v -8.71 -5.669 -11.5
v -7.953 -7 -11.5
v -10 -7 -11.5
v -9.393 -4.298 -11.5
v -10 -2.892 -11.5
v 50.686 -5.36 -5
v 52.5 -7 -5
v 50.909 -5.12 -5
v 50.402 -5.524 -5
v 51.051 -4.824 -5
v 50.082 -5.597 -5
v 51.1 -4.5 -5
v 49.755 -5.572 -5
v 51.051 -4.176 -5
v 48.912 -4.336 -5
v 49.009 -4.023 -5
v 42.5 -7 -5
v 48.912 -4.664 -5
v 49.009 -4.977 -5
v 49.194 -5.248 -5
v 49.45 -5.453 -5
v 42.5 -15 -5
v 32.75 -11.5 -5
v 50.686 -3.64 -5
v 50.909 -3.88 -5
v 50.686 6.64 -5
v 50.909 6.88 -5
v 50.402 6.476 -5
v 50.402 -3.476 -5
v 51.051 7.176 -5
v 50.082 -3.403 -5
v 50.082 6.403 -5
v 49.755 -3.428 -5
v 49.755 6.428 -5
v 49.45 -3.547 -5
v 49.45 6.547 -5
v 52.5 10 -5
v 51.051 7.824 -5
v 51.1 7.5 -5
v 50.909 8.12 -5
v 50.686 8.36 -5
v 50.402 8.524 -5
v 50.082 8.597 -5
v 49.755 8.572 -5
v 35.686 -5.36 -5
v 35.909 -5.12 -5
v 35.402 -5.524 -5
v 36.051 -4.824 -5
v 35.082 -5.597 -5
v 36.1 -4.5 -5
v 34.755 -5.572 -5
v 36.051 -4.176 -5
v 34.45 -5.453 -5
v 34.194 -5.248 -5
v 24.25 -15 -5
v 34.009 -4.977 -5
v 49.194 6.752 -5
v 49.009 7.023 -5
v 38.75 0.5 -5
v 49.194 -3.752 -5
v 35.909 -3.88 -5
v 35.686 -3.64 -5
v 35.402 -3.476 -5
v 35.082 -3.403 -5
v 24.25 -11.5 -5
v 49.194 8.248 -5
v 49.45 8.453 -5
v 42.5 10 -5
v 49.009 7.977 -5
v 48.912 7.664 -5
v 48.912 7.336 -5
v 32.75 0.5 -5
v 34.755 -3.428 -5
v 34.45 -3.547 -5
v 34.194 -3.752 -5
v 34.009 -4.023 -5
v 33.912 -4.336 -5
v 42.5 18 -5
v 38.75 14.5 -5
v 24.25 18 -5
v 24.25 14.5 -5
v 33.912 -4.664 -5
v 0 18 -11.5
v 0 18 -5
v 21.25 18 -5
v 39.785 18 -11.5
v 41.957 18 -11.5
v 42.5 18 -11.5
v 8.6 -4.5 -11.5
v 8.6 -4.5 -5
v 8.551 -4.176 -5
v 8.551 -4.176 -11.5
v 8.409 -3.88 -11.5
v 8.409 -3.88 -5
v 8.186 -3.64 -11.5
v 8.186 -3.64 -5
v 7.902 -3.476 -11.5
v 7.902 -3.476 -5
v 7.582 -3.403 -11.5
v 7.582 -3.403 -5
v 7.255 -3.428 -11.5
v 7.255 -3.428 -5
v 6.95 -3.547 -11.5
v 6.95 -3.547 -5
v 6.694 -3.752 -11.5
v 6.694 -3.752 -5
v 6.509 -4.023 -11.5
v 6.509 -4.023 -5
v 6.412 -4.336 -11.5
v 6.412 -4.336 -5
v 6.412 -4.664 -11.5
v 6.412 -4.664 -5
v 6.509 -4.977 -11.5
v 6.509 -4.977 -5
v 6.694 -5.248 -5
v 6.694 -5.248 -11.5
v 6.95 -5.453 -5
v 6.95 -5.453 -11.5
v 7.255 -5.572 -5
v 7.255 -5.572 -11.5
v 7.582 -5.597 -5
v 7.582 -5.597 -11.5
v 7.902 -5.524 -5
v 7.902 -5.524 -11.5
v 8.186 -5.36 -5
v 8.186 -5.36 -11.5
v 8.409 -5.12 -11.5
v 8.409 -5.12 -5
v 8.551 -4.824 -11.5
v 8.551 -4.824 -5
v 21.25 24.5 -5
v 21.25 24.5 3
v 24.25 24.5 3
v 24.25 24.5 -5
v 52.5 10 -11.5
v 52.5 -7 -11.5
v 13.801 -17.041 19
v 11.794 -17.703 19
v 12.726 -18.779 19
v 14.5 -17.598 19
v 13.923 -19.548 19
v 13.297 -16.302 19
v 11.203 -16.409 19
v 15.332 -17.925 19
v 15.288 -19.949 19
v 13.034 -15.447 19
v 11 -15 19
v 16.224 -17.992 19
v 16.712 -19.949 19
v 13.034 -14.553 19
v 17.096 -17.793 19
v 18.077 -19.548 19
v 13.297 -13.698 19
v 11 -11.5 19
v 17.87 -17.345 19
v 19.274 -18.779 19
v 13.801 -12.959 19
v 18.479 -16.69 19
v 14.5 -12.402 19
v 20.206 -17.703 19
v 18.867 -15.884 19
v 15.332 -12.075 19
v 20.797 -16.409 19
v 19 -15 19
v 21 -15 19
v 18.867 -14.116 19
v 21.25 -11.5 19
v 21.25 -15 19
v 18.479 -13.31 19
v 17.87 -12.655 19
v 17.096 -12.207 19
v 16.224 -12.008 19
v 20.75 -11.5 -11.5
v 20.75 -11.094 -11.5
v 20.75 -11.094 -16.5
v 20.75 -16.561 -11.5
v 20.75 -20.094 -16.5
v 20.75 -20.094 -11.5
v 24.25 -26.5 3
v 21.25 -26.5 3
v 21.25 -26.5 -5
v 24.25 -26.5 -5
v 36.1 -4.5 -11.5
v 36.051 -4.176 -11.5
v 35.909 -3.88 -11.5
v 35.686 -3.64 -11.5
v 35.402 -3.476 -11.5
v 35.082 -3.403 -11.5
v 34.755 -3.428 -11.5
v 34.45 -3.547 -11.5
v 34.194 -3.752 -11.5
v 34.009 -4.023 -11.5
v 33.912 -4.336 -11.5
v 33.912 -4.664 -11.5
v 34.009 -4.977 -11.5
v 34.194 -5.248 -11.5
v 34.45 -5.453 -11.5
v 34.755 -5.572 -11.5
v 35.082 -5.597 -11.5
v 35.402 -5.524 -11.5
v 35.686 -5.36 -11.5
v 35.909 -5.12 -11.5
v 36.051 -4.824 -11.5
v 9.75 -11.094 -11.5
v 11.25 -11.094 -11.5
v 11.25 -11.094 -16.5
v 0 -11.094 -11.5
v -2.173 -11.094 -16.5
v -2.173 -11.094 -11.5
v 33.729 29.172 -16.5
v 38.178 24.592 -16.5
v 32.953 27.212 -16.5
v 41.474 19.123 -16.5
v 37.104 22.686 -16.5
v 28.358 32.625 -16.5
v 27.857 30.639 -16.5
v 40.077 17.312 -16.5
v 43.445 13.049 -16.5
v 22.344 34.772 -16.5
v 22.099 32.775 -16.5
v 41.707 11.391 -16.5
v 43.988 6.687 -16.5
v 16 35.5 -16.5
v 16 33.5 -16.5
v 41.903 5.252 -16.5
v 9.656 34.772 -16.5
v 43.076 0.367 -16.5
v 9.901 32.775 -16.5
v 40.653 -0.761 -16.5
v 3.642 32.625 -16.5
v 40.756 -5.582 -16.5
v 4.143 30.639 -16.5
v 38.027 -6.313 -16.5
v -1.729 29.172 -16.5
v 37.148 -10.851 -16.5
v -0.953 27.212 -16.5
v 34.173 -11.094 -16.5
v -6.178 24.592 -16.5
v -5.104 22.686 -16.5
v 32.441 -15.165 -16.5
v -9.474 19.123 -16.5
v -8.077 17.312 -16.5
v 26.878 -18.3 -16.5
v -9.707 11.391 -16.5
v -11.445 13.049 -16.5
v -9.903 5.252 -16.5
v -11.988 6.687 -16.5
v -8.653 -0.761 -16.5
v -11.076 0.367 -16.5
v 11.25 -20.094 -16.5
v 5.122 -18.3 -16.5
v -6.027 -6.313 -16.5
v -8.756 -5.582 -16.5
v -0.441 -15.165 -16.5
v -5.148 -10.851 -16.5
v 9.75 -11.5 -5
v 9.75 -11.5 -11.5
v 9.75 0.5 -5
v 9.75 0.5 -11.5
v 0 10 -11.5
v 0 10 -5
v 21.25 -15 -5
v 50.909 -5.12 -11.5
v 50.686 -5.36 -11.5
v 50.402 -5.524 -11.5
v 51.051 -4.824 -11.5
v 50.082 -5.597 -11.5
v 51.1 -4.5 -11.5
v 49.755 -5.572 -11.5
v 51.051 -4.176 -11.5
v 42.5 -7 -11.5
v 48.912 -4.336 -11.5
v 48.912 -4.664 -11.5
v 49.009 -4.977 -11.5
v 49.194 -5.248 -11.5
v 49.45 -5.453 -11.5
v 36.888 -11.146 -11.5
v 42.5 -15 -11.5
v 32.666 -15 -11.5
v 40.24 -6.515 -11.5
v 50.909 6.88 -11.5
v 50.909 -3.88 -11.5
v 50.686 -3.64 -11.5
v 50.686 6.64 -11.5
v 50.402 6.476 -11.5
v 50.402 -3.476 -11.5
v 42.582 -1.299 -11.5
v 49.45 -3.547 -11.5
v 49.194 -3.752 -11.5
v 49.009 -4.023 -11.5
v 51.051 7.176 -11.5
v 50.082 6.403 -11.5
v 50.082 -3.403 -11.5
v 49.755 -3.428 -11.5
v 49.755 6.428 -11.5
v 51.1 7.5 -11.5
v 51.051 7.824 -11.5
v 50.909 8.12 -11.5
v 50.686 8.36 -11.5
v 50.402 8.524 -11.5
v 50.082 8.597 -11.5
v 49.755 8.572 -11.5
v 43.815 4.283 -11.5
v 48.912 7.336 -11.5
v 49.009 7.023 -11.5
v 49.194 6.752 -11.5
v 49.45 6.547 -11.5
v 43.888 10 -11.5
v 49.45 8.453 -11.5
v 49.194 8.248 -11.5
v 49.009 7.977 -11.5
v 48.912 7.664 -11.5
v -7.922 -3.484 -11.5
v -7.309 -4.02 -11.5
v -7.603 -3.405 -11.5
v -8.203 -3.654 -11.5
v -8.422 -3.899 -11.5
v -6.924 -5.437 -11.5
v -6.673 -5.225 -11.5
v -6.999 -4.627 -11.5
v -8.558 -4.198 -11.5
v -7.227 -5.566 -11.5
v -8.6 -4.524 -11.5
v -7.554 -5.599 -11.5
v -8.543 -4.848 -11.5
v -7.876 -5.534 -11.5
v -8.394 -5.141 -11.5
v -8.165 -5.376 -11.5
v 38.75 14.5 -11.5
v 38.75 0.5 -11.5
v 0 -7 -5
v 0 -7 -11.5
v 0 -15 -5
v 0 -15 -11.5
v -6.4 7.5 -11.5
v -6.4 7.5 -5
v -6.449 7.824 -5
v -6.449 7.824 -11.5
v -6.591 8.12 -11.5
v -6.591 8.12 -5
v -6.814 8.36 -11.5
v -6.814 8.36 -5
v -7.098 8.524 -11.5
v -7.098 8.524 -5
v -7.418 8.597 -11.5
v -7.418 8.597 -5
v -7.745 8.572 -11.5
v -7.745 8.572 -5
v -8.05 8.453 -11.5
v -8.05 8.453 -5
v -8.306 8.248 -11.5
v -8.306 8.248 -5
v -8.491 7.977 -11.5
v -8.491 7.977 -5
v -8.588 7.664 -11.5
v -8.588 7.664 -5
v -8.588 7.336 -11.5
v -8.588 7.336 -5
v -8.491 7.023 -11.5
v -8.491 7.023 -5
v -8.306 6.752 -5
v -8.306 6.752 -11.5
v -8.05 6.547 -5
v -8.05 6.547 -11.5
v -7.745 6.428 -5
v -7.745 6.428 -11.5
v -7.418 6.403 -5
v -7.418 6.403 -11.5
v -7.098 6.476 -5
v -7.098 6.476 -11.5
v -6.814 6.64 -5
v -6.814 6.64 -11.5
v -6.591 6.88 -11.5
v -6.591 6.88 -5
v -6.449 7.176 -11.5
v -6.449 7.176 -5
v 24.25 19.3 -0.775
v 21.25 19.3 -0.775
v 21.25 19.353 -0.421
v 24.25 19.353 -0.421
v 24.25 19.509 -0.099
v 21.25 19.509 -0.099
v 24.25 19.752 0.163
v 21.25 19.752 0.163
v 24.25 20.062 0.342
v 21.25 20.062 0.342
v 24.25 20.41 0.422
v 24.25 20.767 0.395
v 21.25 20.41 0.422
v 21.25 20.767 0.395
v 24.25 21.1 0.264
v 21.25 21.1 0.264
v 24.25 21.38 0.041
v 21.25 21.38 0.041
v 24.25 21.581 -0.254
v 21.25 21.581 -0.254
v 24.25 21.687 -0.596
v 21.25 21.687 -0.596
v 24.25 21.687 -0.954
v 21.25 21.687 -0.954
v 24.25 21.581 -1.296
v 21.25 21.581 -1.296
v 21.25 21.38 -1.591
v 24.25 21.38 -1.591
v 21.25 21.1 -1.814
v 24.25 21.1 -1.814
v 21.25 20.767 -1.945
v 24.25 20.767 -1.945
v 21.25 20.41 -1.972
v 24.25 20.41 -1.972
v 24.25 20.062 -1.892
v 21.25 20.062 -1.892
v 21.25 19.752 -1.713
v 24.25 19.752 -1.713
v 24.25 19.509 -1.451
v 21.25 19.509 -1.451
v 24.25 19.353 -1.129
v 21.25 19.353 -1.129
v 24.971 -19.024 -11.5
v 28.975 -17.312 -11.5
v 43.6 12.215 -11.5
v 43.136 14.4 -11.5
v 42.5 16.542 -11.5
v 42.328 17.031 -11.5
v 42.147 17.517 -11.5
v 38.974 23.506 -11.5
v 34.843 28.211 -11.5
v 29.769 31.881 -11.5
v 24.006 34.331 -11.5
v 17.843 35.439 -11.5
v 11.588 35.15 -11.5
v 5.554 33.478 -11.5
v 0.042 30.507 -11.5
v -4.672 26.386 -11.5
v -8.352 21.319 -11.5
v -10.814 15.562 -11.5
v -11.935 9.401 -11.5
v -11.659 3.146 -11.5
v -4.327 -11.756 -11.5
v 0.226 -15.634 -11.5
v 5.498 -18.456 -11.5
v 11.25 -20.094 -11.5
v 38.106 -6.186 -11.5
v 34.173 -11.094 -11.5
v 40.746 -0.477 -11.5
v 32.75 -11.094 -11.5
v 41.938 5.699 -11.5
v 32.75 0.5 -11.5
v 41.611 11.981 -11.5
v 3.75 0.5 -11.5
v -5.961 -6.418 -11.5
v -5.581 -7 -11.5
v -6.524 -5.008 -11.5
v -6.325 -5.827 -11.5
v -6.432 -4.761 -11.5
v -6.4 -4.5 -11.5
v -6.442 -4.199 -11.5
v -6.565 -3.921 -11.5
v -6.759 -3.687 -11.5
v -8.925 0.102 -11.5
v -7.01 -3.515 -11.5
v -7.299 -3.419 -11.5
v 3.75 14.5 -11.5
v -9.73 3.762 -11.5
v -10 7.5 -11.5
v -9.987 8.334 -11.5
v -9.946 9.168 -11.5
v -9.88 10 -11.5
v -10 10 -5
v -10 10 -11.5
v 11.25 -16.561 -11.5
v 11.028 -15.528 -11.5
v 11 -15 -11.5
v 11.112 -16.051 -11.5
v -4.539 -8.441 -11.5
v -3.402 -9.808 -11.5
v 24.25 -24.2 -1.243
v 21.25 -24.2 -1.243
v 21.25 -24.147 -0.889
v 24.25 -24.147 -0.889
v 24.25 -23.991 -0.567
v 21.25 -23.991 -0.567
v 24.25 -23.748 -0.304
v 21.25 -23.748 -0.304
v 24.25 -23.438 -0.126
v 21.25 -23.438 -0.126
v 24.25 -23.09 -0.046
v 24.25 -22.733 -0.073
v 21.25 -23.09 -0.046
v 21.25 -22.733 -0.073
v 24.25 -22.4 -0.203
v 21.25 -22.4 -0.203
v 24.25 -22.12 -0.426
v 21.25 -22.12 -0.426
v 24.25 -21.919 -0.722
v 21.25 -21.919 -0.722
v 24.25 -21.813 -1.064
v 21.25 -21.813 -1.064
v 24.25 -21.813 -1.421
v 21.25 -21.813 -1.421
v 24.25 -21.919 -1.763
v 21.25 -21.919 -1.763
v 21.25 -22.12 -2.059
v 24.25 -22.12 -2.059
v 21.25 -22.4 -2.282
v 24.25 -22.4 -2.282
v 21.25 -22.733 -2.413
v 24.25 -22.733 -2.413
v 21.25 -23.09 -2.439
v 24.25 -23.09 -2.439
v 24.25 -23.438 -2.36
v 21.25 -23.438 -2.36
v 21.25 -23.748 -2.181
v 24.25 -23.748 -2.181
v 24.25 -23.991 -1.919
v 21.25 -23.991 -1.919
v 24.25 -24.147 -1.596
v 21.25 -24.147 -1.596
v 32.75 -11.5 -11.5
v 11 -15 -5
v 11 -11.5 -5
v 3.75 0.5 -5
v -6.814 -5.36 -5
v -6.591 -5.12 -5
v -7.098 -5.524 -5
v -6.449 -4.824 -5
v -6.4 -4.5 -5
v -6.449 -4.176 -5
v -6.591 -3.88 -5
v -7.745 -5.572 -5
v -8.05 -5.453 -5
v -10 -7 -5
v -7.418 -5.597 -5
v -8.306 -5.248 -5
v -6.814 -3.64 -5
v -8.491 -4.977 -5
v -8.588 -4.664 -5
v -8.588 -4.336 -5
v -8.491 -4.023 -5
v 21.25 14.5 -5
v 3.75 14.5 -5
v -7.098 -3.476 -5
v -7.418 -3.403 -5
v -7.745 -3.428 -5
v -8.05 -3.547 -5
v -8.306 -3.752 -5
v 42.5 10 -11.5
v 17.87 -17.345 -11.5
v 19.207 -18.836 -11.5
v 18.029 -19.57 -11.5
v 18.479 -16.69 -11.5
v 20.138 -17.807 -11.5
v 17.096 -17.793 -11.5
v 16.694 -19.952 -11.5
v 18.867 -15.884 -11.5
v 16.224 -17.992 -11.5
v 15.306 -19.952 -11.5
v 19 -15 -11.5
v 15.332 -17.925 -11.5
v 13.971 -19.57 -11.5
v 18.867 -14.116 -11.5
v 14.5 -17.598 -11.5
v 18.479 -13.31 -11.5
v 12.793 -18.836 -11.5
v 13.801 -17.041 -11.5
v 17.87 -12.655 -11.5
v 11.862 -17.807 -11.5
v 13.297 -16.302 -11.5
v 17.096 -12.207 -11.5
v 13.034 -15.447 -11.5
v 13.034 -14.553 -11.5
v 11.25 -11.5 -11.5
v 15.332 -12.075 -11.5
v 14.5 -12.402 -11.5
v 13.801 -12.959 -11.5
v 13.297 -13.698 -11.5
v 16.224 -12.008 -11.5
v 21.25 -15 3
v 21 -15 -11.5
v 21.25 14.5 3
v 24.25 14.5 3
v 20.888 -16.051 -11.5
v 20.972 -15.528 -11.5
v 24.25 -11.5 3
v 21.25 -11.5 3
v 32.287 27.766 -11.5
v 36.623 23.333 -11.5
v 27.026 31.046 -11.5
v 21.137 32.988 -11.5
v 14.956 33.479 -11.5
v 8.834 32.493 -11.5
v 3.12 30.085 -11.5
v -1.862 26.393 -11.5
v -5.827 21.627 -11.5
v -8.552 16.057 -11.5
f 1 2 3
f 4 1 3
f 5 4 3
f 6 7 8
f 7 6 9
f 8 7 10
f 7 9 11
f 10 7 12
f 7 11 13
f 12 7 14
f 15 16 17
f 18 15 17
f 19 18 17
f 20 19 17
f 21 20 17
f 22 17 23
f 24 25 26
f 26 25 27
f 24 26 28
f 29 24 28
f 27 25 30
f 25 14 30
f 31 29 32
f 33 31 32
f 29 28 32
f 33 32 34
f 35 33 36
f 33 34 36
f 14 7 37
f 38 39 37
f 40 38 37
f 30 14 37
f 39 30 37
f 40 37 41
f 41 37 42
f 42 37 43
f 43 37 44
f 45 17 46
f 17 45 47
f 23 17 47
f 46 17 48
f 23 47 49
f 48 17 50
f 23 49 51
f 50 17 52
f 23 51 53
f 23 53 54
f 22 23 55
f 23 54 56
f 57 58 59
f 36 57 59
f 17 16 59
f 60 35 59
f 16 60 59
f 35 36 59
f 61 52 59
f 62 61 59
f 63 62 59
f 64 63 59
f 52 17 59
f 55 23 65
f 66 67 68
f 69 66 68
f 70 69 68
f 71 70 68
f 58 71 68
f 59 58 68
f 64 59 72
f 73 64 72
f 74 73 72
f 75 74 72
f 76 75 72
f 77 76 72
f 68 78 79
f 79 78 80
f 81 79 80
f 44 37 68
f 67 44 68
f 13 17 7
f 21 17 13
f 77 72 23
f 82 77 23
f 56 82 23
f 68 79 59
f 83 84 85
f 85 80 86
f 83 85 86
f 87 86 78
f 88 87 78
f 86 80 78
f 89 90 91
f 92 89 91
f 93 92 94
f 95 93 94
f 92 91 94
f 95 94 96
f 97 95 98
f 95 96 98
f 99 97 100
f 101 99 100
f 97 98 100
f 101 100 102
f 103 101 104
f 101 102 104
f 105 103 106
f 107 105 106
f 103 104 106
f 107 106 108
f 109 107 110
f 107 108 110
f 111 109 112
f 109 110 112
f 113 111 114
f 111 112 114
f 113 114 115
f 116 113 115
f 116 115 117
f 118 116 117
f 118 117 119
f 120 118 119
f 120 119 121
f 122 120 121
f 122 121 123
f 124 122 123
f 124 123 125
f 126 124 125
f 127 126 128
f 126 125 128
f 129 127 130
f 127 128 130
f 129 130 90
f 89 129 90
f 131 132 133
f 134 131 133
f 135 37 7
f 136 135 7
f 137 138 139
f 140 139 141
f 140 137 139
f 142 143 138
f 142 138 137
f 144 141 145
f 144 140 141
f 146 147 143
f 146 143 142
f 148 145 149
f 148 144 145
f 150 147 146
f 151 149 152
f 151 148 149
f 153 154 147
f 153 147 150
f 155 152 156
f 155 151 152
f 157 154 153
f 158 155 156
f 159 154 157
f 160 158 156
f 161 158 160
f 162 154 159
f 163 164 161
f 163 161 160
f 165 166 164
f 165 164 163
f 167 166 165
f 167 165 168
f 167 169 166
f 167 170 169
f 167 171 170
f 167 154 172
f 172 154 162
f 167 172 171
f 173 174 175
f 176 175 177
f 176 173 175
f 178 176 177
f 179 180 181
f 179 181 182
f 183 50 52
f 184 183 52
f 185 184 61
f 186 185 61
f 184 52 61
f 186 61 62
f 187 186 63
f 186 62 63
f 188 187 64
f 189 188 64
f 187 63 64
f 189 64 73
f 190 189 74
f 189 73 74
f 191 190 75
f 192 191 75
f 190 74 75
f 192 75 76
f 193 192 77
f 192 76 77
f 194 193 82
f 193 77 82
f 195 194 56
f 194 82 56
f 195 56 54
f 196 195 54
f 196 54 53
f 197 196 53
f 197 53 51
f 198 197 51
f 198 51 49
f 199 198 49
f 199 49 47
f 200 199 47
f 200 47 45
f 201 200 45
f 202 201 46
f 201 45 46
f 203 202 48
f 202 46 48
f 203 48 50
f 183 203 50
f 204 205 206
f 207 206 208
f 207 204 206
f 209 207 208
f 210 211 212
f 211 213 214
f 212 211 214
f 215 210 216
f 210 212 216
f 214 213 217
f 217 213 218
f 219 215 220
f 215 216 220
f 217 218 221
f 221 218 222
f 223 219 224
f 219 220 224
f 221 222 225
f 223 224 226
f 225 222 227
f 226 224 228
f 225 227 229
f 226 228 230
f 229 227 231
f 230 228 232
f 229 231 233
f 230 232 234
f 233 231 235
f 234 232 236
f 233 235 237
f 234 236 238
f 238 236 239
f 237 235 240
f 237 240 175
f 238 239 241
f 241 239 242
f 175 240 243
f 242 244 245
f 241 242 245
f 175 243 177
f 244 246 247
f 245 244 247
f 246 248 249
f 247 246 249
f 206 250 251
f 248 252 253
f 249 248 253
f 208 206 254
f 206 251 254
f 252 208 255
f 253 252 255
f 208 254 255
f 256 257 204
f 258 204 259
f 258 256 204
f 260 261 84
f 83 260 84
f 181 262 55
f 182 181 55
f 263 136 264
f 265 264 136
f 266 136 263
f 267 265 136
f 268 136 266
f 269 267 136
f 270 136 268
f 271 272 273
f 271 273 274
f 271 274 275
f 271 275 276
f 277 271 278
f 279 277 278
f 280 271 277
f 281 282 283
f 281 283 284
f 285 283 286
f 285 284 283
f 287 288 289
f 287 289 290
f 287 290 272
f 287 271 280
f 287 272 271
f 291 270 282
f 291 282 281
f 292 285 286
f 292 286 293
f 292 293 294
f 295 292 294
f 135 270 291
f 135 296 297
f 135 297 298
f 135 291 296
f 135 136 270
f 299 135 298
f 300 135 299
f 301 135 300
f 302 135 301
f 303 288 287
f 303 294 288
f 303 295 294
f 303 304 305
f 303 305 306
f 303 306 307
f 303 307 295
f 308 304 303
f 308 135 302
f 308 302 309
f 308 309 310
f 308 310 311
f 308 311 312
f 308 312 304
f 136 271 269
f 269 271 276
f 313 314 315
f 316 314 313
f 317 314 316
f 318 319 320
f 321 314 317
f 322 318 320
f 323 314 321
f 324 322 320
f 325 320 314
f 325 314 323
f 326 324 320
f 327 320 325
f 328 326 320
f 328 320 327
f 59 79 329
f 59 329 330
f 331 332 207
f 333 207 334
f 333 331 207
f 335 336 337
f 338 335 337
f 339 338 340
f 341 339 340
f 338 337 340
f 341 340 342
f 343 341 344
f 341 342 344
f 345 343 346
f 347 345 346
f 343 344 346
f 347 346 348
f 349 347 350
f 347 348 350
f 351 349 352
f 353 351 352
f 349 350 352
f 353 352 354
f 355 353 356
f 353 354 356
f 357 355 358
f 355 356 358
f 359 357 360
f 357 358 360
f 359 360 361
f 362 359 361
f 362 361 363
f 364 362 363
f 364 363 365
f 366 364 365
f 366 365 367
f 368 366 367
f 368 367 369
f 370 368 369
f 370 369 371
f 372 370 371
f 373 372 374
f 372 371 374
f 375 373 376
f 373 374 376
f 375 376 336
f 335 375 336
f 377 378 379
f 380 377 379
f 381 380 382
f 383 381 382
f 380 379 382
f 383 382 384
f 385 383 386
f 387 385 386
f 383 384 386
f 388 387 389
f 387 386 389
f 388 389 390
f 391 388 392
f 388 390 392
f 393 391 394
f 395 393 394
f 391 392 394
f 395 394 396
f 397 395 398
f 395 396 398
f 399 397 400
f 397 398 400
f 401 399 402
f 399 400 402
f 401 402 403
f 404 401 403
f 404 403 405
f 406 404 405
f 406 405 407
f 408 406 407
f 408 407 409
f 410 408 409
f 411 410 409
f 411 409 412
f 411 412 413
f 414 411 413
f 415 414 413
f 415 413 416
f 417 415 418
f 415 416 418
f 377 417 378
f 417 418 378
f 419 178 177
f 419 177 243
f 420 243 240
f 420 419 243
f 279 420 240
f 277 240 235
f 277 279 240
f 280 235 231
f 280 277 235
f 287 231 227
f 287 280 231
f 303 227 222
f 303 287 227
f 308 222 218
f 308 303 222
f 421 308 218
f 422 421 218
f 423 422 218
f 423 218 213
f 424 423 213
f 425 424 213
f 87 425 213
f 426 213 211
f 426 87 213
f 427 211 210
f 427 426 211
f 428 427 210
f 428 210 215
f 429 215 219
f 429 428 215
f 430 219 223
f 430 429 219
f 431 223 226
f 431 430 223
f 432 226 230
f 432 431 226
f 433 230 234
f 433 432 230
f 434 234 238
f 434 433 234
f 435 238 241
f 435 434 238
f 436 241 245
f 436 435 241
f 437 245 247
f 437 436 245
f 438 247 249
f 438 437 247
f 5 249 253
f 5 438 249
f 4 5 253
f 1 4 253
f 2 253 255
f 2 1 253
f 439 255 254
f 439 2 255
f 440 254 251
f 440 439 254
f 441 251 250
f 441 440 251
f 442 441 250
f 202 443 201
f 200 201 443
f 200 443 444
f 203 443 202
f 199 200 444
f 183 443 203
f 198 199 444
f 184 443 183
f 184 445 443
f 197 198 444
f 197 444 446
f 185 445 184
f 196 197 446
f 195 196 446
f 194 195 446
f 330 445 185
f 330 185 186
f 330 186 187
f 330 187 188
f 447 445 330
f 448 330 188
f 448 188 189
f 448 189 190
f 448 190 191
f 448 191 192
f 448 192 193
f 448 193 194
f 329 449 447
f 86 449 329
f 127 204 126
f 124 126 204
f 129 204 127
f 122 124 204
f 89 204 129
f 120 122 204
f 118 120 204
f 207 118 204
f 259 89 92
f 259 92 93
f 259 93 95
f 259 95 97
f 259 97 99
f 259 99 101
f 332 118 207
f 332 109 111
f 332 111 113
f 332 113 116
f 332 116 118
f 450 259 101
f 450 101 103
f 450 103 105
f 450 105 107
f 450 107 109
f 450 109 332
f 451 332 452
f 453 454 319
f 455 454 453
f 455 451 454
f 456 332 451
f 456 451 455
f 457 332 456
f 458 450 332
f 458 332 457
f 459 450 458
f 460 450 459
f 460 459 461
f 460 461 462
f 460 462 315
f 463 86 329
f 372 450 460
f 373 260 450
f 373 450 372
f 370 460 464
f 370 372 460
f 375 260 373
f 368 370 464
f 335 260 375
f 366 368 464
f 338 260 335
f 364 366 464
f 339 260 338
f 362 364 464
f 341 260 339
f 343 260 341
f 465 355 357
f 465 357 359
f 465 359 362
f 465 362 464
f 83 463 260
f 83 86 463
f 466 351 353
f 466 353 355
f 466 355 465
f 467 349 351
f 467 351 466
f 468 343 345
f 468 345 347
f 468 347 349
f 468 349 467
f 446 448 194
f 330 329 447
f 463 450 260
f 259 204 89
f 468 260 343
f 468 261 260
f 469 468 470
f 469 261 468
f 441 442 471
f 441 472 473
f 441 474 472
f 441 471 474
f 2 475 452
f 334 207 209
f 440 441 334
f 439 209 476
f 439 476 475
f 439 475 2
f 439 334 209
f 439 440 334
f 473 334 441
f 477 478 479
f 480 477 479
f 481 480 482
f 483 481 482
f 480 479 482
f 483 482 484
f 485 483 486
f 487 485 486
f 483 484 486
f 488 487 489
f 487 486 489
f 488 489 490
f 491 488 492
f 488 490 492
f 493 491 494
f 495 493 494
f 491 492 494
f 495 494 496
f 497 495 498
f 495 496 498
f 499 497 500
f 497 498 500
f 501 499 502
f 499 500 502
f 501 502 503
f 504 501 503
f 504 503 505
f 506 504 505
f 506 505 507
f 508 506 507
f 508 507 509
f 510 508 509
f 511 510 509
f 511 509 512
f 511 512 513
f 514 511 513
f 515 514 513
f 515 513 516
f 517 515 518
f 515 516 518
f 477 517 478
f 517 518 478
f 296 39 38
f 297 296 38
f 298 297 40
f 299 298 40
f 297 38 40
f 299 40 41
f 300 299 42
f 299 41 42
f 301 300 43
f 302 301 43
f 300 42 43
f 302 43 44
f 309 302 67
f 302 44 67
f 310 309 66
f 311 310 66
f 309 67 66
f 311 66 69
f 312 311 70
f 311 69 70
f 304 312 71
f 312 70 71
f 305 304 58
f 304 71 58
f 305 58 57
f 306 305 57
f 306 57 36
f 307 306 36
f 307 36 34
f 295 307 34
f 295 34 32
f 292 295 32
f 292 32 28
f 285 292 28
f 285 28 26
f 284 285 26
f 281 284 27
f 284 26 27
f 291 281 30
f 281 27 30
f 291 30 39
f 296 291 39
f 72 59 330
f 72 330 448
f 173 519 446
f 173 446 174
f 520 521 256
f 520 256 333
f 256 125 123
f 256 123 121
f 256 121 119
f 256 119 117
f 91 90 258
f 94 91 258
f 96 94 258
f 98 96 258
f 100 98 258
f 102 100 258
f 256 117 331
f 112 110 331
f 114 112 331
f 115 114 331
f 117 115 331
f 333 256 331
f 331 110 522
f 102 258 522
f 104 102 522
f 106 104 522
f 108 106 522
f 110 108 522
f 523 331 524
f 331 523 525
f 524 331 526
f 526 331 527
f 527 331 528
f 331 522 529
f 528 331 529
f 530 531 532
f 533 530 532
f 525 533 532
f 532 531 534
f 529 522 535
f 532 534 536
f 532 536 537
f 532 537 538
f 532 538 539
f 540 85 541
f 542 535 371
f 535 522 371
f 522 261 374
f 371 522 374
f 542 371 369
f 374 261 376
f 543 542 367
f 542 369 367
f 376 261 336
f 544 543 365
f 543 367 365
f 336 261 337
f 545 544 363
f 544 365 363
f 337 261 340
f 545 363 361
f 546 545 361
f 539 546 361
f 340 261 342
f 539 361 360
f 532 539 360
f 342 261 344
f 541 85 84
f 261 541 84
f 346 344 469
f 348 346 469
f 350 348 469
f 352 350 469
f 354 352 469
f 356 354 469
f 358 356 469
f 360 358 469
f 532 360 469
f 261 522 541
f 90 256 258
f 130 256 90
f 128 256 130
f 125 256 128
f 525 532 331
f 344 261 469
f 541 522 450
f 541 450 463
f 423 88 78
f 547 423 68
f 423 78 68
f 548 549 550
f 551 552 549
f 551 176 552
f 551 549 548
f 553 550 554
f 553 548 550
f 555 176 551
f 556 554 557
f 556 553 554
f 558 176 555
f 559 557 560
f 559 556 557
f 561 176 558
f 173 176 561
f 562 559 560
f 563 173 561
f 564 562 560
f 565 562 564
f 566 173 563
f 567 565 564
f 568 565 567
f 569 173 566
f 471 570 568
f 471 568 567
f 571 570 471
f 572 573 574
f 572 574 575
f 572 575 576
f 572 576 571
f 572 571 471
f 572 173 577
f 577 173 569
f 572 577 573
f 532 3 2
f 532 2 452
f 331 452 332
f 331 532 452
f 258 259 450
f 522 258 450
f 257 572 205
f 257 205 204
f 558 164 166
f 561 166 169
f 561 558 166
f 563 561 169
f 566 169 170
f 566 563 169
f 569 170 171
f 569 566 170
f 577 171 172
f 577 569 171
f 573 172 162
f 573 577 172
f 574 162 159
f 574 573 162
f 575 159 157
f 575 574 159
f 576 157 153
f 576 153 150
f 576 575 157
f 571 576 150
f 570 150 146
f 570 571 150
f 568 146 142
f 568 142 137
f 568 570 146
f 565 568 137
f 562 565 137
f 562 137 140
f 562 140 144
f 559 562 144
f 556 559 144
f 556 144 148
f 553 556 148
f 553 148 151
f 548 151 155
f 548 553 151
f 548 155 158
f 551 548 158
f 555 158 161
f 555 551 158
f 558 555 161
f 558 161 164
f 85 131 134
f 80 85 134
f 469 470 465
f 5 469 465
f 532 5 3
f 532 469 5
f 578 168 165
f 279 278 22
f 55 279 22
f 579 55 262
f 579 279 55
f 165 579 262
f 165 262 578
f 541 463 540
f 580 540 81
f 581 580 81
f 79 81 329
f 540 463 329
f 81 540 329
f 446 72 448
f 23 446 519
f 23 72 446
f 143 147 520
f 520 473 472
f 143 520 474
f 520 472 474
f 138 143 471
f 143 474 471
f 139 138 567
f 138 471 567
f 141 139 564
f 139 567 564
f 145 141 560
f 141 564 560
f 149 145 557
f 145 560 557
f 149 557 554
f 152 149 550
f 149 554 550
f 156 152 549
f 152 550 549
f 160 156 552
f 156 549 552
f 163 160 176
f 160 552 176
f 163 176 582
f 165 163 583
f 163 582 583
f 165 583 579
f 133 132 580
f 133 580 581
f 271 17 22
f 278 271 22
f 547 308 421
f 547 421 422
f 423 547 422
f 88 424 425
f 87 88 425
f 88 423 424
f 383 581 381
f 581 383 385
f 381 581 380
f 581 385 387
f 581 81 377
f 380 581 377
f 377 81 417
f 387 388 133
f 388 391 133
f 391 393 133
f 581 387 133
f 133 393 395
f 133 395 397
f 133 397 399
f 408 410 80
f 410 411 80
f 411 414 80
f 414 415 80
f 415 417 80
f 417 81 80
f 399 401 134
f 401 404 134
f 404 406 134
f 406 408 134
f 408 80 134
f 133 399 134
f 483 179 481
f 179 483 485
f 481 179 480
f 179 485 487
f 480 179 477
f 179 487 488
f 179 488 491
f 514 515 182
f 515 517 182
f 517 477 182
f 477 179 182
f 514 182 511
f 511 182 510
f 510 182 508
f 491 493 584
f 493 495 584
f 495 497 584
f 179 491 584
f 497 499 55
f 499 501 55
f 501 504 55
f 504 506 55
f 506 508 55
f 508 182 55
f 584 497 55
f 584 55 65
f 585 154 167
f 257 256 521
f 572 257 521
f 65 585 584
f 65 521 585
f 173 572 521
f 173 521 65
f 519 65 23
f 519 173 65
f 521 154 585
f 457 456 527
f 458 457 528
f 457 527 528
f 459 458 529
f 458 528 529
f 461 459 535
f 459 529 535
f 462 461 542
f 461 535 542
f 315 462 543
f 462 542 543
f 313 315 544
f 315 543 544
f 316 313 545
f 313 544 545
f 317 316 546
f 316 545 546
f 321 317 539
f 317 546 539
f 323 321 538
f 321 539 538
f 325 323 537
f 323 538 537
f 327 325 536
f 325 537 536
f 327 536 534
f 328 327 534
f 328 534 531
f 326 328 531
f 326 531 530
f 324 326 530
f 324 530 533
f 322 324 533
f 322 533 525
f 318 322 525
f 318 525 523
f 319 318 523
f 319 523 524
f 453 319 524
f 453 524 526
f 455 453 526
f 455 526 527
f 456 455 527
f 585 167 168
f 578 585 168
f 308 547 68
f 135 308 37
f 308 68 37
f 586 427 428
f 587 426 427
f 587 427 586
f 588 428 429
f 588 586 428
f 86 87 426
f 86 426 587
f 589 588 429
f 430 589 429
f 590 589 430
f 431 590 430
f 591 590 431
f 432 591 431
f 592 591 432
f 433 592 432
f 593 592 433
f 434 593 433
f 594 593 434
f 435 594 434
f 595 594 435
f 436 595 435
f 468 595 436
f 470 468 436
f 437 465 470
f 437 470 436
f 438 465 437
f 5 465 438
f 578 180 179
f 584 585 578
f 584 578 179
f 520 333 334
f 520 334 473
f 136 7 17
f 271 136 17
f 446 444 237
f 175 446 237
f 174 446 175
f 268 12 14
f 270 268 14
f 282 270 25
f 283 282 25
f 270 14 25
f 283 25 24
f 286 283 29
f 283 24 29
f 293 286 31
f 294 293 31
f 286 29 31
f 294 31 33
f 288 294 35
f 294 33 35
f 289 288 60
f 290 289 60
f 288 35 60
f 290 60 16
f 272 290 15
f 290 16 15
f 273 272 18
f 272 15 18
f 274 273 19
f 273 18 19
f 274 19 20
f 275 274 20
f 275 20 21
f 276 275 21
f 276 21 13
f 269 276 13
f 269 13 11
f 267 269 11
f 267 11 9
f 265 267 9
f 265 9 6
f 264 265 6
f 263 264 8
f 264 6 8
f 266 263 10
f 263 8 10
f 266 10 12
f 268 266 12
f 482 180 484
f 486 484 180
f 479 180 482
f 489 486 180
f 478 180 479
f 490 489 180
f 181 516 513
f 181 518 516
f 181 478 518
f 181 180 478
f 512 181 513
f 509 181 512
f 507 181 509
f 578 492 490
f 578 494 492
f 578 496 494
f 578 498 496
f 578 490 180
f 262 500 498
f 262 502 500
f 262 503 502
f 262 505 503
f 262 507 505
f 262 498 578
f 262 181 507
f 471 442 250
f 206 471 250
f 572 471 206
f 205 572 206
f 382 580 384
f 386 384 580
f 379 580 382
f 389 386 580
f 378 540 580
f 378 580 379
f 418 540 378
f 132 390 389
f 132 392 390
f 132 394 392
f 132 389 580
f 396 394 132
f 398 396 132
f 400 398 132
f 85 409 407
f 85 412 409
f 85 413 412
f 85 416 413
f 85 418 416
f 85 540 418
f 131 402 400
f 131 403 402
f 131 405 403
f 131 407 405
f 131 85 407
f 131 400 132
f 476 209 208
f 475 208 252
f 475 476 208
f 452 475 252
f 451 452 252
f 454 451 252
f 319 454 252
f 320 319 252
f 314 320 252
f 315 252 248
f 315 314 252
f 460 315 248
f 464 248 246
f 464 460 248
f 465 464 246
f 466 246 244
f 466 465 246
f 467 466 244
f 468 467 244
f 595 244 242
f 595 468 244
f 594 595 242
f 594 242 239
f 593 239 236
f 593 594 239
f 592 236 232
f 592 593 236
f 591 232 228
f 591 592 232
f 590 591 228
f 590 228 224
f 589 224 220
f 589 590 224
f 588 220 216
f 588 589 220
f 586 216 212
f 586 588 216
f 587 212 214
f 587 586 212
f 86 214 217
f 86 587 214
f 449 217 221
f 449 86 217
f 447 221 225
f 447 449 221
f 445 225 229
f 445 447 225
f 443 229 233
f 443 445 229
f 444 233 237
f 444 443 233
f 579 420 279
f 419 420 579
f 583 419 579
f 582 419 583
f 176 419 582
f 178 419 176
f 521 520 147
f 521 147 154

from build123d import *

# Parameters (mm, degrees)
SKETCH009_R     = 3
SKETCH009_R_2   = 1.1
PAD004_DEPTH    = 6.5
PAD005_DEPTH    = 5
SKETCH017_W     = 3
SKETCH017_H     = 10
SKETCH017_H_2   = 15
PAD010_DEPTH    = 8
SKETCH018_R     = 3
PAD011_DEPTH    = 24
SKETCH019_R     = 1.2
POCKET004_DEPTH = 3
SKETCH020_R     = 1.2
POCKET005_DEPTH = 3


with BuildPart() as part:
    # Sketch009 → Pad004 (new body)
    with BuildSketch(Plane.XY.offset(-5)):
        with BuildLine():
            Line((42.5, 10), (52.5, 10))
            Line((52.5, 10), (52.5, -7))
            Line((52.5, -7), (42.5, -7))
            Line((42.5, -7), (42.5, -15))
            Line((42.5, -15), (21, -15))
            ThreePointArc((11, -15), (16, -20), (21, -15))
            Line((0, -15), (11, -15))
            Line((0, -7), (0, -15))
            Line((-10, -7), (0, -7))
            Line((-10, 10), (-10, -7))
            Line((0, 10), (-10, 10))
            Line((0, 10), (0, 18))
            Line((0, 18), (42.5, 18))
            Line((42.5, 18), (42.5, 10))
        make_face()
        with Locations((16, -15)):
            Circle(SKETCH009_R, mode=Mode.SUBTRACT)
        with Locations((-7.5, -4.5)):
            Circle(SKETCH009_R_2, mode=Mode.SUBTRACT)
        with Locations((-7.5, 7.5)):
            Circle(SKETCH009_R_2, mode=Mode.SUBTRACT)
        with Locations((50, 7.5)):
            Circle(SKETCH009_R_2, mode=Mode.SUBTRACT)
        with Locations((50, -4.5)):
            Circle(SKETCH009_R_2, mode=Mode.SUBTRACT)
        with Locations((7.5, -4.5)):
            Circle(SKETCH009_R_2, mode=Mode.SUBTRACT)
        with Locations((35, -4.5)):
            Circle(SKETCH009_R_2, mode=Mode.SUBTRACT)
        Polygon((38.75, 14.5), (38.75, 0.5), (32.75, 0.5), (32.75, -11.5), (9.75, -11.5), (9.75, 0.5), (3.75, 0.5), (3.75, 14.5), align=None, mode=Mode.SUBTRACT)
    extrude(amount=-PAD004_DEPTH)

    # Sketch010 → Pad005 (new body)
    with BuildSketch(Plane(origin=(0, 0, -11.5), x_dir=(1, 0, 0), z_dir=(0, 0, -1))):
        with BuildLine():
            Line((11.25, 20.094157), (11.25, 11.094157))
            Line((11.25, 11.094157), (-2.172983, 11.094157))
            ThreePointArc((-2.172983, 11.094157), (16, -33.5), (34.172983, 11.094157))
            Line((34.172983, 11.094157), (20.75, 11.094157))
            Line((20.75, 11.094157), (20.75, 20.094157))
            ThreePointArc((20.75, 20.094157), (16, -35.5), (11.25, 20.094157))
        make_face()
    extrude(amount=PAD005_DEPTH)

    # Sketch017 → Pad010 (new body)
    with BuildSketch(Plane.XY.offset(-5)):
        with Locations((22.75, 19.5)):
            Rectangle(SKETCH017_W, SKETCH017_H)
        with Locations((22.75, -19)):
            Rectangle(SKETCH017_W, SKETCH017_H_2)
    extrude(amount=PAD010_DEPTH)

    # Sketch018 → Pad011 (new body)
    with BuildSketch(Plane.XY.offset(-5)):
        with BuildLine():
            ThreePointArc((11, -15), (16, -20), (21, -15))
            Line((21.25, -15), (21, -15))
            Line((21.25, -11.5), (21.25, -15))
            Line((11, -11.5), (21.25, -11.5))
            Line((11, -15), (11, -11.5))
        make_face()
        with Locations((16, -15)):
            Circle(SKETCH018_R, mode=Mode.SUBTRACT)
    extrude(amount=PAD011_DEPTH)

    # Sketch019 → Pocket004 (cut)
    with BuildSketch(Plane(origin=(21.25, 0, -5), x_dir=(0, -1, 0), z_dir=(-1, 0, 0))):
        with Locations((23, 3.757359)):
            Circle(SKETCH019_R)
    extrude(amount=-POCKET004_DEPTH, mode=Mode.SUBTRACT)

    # Sketch020 → Pocket005 (cut)
    with BuildSketch(Plane(origin=(21.25, 0, -5), x_dir=(0, -1, 0), z_dir=(-1, 0, 0))):
        with Locations((-20.5, 4.225083)):
            Circle(SKETCH020_R)
    extrude(amount=-POCKET005_DEPTH, mode=Mode.SUBTRACT)


solid = part.part
